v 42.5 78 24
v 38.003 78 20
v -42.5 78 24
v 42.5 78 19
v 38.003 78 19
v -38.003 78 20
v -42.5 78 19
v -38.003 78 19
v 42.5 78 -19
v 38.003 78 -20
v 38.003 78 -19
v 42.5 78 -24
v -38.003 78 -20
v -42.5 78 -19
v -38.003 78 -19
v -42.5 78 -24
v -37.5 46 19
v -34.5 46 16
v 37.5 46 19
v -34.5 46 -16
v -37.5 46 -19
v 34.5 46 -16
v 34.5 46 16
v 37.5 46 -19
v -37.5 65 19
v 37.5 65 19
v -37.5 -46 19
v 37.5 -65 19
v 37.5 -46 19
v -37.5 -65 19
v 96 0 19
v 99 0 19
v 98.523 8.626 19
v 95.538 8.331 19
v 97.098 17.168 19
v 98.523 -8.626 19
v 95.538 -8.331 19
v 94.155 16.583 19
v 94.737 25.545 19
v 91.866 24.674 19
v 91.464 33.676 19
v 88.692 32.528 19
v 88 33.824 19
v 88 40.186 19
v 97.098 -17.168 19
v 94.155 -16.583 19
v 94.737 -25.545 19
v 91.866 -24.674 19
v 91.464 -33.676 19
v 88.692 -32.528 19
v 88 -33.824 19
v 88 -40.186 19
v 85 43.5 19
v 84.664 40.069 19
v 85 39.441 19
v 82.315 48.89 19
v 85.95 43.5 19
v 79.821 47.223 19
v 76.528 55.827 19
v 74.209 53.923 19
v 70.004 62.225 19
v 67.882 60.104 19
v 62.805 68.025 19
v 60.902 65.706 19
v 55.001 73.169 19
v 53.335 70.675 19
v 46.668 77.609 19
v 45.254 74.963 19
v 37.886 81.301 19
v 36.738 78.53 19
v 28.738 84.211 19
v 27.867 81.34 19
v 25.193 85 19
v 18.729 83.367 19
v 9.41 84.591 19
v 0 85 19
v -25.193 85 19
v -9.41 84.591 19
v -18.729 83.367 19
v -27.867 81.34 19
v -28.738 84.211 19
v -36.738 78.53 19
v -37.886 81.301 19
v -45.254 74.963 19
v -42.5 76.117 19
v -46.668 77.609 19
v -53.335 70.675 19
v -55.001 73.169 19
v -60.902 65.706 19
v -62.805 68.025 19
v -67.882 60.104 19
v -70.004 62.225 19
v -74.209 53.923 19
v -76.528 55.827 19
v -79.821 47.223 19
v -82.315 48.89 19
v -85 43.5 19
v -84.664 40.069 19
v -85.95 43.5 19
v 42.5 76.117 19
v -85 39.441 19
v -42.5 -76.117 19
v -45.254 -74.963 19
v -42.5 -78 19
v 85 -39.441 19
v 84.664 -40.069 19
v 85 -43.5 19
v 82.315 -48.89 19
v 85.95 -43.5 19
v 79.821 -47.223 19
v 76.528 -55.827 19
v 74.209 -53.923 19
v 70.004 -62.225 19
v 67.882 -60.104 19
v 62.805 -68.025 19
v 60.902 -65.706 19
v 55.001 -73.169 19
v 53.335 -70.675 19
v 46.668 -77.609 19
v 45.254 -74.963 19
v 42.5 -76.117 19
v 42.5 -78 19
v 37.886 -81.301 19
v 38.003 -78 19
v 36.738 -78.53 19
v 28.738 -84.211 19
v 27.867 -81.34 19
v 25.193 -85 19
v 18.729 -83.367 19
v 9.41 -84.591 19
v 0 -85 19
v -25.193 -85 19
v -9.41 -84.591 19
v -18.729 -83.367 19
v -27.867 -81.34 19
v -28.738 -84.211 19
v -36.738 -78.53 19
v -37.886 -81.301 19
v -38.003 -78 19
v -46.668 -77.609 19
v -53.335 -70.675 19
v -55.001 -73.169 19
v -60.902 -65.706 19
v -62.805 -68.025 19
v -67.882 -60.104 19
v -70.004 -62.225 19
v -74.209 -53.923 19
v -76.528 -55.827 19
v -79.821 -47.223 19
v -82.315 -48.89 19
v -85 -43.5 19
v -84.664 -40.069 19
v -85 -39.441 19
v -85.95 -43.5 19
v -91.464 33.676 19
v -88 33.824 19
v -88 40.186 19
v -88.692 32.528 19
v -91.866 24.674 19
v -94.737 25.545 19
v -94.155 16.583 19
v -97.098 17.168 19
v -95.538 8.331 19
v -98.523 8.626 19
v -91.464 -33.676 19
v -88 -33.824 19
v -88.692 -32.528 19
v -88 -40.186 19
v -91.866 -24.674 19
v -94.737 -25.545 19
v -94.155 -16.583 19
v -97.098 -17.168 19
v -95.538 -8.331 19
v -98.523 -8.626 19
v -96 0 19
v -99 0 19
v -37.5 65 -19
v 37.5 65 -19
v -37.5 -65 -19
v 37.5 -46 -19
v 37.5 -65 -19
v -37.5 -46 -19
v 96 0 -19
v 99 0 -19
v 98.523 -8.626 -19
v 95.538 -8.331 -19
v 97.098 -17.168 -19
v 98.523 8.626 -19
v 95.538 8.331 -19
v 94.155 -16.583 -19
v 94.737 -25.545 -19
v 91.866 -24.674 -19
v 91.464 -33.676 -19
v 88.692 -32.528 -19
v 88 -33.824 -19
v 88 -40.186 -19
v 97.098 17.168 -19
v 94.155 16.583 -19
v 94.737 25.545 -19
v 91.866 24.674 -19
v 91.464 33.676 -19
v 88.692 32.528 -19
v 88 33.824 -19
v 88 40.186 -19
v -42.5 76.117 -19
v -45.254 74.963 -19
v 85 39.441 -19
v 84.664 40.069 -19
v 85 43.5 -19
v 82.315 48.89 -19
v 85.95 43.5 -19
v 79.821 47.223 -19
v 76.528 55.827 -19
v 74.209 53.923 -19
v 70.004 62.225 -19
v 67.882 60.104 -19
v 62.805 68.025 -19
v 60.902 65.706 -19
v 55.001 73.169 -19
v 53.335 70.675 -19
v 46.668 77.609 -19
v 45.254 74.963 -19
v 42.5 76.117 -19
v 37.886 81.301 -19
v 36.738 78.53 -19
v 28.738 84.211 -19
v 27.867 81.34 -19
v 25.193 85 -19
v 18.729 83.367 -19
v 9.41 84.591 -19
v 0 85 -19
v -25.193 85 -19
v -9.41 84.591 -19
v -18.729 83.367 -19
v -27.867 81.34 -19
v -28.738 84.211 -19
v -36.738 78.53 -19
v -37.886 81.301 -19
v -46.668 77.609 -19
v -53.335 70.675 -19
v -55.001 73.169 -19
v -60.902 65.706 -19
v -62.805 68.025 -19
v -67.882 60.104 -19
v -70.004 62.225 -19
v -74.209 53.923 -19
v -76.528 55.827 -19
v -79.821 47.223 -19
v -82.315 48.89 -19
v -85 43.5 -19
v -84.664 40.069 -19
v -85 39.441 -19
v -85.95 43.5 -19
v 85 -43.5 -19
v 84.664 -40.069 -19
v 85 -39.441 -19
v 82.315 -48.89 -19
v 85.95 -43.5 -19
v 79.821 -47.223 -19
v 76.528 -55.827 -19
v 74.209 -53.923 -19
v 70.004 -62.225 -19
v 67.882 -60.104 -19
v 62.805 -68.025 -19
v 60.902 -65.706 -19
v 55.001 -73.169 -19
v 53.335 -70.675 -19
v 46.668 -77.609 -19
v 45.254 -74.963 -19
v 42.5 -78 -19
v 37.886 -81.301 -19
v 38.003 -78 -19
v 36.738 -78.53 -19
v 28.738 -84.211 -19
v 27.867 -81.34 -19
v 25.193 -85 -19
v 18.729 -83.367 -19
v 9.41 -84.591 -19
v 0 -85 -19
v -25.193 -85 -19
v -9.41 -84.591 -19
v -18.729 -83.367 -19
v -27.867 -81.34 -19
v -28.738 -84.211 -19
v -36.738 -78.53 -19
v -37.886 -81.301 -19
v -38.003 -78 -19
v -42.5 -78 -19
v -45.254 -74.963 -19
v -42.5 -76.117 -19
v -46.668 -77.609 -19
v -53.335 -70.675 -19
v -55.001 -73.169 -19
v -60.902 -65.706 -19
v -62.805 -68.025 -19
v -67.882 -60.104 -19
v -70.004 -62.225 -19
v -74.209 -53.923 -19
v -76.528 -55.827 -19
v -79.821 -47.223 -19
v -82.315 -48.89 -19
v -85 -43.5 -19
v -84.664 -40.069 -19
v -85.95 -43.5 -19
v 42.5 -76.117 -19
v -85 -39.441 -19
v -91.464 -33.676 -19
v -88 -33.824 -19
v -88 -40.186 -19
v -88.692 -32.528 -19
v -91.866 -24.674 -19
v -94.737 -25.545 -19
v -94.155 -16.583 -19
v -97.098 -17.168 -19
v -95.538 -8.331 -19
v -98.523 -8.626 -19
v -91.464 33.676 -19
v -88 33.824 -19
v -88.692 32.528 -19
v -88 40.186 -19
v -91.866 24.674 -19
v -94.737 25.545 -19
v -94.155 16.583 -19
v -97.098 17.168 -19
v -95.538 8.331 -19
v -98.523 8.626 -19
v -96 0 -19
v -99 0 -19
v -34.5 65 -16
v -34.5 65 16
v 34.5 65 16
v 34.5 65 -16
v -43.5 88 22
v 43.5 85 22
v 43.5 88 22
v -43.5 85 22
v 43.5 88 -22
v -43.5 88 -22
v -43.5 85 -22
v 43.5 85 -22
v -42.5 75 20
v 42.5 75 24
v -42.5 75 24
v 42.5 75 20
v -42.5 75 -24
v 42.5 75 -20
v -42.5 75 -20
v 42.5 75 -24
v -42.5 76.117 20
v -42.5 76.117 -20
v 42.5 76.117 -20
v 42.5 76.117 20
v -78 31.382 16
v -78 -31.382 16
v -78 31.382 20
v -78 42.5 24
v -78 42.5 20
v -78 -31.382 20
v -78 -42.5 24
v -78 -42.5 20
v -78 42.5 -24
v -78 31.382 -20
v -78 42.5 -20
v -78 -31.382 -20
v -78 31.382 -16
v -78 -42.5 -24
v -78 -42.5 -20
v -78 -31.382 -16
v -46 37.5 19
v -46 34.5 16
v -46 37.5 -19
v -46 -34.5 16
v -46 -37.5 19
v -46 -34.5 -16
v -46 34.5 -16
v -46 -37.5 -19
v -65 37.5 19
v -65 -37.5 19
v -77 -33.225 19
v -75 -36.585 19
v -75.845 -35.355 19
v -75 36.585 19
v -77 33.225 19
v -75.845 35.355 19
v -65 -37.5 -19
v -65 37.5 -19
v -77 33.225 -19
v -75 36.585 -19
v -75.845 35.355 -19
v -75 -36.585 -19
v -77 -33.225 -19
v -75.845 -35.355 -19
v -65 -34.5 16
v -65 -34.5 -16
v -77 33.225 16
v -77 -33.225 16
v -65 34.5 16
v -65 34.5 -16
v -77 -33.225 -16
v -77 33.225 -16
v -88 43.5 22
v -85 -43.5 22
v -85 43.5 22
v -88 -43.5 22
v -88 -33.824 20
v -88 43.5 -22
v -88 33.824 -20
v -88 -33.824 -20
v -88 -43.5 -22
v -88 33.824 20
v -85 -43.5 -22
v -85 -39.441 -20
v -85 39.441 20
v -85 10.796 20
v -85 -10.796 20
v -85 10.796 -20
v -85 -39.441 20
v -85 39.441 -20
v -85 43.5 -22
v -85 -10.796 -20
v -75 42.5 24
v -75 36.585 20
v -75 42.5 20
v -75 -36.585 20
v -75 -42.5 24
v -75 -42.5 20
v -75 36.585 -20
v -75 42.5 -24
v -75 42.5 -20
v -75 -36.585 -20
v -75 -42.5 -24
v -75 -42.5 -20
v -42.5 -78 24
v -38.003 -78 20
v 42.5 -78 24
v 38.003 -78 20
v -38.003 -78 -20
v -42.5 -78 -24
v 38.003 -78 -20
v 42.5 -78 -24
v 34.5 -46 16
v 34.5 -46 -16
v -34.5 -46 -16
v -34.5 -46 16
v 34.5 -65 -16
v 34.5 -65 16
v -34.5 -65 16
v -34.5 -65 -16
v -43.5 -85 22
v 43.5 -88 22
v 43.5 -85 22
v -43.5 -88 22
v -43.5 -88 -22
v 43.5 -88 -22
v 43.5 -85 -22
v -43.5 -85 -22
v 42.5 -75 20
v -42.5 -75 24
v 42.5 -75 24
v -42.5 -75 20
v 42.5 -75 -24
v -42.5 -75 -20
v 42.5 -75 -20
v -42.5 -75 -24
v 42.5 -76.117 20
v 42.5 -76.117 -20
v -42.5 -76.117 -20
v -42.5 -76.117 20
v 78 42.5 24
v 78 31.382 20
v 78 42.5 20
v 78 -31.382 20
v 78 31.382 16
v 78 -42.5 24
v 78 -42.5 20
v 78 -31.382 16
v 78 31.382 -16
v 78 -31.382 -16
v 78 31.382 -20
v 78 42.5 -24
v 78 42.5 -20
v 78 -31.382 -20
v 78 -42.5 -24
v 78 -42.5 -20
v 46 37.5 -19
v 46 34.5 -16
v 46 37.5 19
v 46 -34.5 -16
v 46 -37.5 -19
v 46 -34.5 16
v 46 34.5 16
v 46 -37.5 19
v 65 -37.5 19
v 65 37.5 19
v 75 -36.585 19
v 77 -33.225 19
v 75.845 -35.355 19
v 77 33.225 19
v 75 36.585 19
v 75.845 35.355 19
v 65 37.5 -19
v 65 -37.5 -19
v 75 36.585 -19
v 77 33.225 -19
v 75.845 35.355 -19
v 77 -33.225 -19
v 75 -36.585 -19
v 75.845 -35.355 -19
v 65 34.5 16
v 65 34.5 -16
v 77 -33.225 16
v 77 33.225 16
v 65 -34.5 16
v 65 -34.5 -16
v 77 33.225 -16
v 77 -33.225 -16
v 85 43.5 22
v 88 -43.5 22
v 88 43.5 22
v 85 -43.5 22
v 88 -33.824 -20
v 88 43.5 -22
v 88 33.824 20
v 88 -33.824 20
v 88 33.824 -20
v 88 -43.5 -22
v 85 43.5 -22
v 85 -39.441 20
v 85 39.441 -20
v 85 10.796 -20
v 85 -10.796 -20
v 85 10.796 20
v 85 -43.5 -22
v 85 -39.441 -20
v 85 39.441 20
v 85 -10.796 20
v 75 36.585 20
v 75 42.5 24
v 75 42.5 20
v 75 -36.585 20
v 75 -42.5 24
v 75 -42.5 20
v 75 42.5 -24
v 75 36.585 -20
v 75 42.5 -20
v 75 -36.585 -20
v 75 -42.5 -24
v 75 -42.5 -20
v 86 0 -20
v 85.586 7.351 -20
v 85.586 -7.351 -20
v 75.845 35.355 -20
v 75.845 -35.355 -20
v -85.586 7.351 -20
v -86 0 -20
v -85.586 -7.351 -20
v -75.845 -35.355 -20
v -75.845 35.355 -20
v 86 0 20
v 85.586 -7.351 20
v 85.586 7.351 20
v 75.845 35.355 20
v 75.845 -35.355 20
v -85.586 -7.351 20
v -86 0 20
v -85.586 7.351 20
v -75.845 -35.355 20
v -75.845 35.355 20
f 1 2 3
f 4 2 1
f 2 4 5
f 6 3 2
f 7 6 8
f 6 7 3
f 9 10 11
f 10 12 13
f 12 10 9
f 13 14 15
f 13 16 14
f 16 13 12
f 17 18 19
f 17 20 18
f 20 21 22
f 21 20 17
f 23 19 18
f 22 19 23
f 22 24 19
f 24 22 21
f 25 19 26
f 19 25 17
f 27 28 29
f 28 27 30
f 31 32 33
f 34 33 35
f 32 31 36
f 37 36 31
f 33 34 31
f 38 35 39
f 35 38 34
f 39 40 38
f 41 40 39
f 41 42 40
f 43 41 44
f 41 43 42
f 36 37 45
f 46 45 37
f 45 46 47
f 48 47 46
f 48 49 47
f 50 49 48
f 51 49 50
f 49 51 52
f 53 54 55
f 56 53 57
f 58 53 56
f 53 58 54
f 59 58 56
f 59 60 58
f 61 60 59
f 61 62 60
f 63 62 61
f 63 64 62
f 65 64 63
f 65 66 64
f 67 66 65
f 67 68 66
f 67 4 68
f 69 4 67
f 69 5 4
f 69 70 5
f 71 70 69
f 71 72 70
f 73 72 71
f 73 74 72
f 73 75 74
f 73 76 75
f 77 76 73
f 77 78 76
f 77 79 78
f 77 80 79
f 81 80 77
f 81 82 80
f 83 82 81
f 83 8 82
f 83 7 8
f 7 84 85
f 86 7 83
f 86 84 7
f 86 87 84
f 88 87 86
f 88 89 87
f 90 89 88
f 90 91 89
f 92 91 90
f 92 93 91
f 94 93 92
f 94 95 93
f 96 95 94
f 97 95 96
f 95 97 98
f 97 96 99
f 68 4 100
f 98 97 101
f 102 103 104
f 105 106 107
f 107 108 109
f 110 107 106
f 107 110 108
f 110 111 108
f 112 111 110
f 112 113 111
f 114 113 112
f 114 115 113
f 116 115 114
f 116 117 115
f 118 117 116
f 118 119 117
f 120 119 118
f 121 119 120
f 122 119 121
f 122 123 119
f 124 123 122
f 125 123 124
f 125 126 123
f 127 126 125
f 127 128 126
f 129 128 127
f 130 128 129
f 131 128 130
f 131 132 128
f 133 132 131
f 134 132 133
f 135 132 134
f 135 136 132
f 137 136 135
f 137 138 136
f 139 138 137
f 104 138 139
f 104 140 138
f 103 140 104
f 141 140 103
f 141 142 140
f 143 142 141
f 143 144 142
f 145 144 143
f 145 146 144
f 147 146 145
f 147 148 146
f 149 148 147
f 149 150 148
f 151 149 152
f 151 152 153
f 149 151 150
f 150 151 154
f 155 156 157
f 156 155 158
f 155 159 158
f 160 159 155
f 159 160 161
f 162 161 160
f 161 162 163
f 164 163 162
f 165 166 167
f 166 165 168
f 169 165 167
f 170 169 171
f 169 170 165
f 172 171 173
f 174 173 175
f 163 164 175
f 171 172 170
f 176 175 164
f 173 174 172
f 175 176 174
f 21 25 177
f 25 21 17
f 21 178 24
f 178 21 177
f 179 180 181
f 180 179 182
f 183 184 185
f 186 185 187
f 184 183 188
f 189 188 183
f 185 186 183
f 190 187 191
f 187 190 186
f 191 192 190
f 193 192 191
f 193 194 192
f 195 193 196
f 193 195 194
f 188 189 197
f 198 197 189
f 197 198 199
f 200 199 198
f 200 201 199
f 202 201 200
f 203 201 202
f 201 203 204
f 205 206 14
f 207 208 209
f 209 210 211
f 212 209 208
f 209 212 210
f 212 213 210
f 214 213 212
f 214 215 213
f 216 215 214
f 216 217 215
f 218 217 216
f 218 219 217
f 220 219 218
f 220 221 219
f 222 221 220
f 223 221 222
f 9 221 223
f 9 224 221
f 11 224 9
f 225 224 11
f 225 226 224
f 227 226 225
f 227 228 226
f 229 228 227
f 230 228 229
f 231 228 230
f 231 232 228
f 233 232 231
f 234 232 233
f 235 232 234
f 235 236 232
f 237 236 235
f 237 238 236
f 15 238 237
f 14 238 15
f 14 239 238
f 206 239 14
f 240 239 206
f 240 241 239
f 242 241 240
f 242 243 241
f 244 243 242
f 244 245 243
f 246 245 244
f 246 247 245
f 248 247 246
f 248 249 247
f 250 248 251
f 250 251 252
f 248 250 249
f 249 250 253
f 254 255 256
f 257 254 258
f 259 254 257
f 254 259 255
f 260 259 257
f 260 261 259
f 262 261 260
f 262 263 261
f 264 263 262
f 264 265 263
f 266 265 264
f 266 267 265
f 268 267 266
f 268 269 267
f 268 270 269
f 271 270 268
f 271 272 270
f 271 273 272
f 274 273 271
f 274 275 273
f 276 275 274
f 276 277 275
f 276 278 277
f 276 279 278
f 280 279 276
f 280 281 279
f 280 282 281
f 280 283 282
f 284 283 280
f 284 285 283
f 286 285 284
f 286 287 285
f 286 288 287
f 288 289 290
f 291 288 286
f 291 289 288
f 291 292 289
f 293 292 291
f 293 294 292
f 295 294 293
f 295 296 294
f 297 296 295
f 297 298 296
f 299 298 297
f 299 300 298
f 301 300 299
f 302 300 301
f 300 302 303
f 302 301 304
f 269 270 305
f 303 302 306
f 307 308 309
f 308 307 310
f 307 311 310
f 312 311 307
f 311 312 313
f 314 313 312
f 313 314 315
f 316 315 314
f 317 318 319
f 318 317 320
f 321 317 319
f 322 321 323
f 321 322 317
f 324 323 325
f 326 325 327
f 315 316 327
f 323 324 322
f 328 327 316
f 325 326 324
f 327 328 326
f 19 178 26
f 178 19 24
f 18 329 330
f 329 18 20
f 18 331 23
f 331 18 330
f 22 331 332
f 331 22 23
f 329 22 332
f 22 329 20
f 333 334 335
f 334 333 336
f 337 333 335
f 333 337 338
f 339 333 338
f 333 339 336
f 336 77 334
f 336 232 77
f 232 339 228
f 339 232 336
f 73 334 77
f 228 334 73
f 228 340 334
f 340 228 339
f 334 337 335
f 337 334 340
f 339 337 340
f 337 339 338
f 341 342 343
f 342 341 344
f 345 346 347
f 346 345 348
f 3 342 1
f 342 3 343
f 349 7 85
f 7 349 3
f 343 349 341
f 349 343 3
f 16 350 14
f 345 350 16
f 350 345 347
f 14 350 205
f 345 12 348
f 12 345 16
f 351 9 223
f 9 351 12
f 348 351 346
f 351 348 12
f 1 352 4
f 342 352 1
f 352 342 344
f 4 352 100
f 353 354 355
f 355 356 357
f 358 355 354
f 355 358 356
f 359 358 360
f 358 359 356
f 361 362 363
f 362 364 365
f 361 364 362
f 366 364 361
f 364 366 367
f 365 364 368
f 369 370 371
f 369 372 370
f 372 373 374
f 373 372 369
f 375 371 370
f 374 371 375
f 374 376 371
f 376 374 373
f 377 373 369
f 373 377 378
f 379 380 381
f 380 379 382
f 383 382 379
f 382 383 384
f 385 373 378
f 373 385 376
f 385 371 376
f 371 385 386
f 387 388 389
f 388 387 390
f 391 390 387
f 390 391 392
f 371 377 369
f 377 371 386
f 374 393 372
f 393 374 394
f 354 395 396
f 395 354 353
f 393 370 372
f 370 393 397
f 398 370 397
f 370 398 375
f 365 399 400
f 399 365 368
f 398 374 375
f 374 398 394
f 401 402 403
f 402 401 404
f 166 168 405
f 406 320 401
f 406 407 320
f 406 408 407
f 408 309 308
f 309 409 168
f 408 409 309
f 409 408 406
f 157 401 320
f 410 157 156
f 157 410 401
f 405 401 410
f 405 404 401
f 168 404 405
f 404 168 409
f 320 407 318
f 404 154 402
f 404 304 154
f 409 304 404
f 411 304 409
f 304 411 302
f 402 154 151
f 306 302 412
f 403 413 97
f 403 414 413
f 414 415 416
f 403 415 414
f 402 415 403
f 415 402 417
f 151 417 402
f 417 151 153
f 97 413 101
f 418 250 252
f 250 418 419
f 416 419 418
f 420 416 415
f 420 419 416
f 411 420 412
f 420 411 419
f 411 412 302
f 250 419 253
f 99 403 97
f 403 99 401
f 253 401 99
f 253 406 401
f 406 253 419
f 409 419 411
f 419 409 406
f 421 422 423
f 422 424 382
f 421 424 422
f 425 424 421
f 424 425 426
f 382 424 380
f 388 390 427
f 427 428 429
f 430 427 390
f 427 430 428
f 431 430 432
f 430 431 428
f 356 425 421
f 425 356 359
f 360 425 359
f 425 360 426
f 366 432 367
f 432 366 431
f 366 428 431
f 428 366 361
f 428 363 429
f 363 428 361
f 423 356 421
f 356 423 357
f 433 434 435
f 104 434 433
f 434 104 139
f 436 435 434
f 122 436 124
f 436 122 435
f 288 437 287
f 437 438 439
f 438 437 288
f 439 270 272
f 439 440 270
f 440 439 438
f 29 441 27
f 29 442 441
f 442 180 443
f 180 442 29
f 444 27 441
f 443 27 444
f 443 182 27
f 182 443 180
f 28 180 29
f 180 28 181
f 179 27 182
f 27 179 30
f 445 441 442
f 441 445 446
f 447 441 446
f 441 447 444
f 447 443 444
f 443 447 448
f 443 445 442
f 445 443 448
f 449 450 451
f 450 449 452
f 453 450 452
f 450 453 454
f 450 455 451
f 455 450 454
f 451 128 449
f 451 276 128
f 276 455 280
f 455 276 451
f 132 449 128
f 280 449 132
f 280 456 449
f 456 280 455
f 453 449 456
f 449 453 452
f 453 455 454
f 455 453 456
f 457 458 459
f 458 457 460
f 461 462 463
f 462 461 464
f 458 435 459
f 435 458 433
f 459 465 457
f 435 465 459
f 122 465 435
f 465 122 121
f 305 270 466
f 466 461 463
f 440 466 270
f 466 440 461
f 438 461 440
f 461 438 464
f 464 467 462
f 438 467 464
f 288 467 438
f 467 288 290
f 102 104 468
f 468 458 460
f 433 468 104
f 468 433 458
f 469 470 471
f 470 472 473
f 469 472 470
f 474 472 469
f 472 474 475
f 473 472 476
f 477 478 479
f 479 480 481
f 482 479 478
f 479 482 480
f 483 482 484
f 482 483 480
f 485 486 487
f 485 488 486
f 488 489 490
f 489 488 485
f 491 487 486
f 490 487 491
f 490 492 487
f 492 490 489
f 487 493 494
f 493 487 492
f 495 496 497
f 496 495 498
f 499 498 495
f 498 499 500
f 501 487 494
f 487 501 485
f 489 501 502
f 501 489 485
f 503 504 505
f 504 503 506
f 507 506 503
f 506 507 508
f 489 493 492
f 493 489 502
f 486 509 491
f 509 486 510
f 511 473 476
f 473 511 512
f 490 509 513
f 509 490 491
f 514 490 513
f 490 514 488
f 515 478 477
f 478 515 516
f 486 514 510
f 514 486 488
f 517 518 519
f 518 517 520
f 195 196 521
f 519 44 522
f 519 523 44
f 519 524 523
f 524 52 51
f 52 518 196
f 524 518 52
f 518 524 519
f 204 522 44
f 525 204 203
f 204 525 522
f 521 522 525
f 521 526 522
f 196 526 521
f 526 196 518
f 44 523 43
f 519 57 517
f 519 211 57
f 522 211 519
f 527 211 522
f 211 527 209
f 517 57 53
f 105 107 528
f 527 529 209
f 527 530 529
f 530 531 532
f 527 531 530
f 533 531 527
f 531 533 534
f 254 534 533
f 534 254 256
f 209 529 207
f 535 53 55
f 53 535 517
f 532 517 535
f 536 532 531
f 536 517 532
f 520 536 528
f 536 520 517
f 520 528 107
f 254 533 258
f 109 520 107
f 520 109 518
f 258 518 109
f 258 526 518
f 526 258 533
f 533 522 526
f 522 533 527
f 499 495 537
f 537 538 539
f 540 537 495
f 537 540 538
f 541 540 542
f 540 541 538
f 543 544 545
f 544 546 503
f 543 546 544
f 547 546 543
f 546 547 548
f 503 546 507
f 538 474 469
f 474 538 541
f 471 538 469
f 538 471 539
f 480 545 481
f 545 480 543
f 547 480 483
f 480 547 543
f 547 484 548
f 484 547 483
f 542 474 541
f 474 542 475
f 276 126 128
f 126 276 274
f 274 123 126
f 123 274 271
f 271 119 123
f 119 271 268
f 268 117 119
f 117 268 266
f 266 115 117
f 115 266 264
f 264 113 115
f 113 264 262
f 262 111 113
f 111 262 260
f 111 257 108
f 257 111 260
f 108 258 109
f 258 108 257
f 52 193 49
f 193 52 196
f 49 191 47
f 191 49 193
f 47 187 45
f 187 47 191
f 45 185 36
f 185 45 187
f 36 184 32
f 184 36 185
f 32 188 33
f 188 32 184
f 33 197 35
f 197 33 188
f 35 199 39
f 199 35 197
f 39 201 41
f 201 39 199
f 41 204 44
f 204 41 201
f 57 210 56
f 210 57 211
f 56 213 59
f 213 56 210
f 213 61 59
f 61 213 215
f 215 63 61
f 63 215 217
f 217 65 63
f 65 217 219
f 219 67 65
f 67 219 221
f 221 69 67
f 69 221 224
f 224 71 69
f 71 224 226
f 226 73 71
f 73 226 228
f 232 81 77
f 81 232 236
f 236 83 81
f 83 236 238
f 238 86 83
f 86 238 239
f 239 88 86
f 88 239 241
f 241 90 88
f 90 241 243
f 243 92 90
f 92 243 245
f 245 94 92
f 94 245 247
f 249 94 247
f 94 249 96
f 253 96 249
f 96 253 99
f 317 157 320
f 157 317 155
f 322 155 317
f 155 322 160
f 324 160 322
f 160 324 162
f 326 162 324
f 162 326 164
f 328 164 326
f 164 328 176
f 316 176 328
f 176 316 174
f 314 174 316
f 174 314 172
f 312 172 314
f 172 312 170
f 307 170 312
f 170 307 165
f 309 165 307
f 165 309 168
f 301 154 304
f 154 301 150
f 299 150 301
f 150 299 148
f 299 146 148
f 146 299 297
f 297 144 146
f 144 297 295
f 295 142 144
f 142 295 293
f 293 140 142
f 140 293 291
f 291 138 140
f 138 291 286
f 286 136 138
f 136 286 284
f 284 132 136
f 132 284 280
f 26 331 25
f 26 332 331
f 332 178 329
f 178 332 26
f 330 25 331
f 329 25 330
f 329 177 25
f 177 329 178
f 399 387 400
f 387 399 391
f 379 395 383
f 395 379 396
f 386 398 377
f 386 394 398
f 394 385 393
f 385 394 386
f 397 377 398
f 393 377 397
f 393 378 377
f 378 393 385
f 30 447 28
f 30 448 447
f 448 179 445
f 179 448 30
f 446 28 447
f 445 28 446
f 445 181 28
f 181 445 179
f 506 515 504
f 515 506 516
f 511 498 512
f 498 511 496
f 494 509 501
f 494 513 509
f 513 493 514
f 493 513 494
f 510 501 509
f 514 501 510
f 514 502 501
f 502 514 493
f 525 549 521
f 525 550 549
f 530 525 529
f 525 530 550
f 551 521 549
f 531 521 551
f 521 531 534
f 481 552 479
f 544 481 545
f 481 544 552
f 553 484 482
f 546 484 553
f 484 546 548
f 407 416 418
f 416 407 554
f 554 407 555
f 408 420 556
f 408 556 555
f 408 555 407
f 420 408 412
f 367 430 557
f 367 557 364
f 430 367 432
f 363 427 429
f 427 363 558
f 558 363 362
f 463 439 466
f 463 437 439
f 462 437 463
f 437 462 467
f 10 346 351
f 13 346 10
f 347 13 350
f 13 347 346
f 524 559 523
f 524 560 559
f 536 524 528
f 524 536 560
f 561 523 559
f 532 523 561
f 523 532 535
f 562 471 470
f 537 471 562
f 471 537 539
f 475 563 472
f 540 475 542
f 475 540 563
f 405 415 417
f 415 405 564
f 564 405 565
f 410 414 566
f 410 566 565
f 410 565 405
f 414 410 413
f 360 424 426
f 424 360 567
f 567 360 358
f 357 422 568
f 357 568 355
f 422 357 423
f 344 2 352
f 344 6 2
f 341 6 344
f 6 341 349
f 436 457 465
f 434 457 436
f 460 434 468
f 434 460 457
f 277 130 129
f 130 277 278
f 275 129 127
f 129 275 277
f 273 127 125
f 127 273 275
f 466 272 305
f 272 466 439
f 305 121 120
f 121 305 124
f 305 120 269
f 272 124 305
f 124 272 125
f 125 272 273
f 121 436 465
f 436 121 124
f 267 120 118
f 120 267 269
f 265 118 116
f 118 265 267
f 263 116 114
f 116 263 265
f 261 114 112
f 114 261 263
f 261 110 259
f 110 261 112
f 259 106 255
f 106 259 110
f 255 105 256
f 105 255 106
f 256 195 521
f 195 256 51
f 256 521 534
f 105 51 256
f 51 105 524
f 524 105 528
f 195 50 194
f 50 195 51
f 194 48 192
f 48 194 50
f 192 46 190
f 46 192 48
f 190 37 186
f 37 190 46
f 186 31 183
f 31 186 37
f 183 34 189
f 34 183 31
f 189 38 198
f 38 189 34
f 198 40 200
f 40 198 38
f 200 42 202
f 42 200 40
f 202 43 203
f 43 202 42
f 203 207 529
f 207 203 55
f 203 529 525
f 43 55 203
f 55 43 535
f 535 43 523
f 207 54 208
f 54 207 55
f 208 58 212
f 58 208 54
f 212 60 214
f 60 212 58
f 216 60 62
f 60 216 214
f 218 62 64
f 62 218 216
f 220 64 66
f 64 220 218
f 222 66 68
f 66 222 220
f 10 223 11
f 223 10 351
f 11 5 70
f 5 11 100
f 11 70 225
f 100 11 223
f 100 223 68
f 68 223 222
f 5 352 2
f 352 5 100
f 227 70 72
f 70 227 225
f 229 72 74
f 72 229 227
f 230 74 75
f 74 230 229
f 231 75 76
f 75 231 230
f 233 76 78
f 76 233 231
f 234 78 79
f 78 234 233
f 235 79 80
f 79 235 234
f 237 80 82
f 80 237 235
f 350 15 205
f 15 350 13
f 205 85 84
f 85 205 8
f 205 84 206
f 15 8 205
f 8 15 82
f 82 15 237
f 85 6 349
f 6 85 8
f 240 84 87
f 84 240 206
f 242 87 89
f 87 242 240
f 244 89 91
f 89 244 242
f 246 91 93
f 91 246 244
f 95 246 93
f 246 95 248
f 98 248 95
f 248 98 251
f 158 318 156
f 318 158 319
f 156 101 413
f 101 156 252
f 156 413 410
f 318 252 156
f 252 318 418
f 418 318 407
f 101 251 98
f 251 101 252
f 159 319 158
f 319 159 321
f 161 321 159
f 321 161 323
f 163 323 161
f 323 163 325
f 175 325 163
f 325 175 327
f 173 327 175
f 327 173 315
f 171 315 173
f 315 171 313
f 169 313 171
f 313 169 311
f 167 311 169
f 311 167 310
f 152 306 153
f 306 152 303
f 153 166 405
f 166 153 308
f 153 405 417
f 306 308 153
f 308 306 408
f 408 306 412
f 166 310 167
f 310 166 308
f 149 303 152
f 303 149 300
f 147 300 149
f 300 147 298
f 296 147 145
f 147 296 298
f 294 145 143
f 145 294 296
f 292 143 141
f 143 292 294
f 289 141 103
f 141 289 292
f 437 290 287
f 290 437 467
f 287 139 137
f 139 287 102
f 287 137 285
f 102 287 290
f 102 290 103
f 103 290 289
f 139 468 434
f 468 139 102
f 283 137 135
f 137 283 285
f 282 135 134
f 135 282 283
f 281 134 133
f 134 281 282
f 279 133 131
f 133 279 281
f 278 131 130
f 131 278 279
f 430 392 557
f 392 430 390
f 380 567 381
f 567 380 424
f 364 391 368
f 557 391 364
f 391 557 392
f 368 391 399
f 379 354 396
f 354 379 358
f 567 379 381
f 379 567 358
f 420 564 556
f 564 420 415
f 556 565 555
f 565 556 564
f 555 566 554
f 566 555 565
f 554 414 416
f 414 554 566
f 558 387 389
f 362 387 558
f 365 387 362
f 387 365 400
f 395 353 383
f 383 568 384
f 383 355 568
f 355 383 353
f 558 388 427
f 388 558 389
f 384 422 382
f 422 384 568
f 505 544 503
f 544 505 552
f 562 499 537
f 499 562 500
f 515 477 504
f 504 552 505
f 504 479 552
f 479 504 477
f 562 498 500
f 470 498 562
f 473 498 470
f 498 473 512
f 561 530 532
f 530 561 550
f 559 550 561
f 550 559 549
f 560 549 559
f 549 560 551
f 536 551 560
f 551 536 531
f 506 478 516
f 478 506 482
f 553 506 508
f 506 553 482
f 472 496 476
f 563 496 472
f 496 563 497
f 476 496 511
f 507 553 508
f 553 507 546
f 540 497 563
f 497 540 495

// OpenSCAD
// ===========================================================================
// HULL-FRAME COORDINATE STANDARD - Rev R1 (2026-06-11).  See CLAUDE.md.
//   Hull frame (canonical for ALL design artifacts): X = +port (left),
//   Y = +aft (back), Z = +dorsal (up); origin = SerenityAssembly.FCStd
//   world origin.  Primary-component STLs published to airframe/stls/
//   are stored directly in hull frame, baked by tools/bake_hull_frame.py
//   (marker 'SerenityUAV HULL-FRAME R1' in the binary STL header).
//   NEVER re-bake a mesh derived from an already-baked file.
//   This file:
//     Part-local frame.  DEFERRED - Phase 11 (aft fuselage EDF).  On
//     integration, position in hull frame per the validated assembly and
//     bake or place explicitly; stations quoted from nose convert to hull
//     Y via nose tip at hull Y = -305.6 mm.
// ===========================================================================
// neck_intake_frame.scad
// CF-PETG structural intake frame ring for Serenity Rev N 24" hull.
// Bonds into the 4 radial scoop cutouts in middle_canonical_edf_intake.stl
// at the neck station (Z = 30 mm in the neck shell, Z-longitudinal coords).
// Print in CF-PETG; bond with structural epoxy.
//
// Rev C (2026-06-02): Z-longitudinal axis correction.
//   Coordinate system: Z = longitudinal (fore-aft), X = lateral, Y = vertical.
//   Both middle and rear shells sit on their flat Z=0 face for printing.
//   Hull dimensions re-measured via Z-slice at Z=30 mm.
//   See blender_middle_intake_cut.py Rev C for matching hull cut parameters.
//
// Coordinate origin: hull XY centreline at intake station.
// Frame axial direction = Z (same as hull longitudinal).

// ── Hull cross-section at intake station Z = 30 mm (measured, 24" scale) ────
// Source: Z-slice sweep of middle_canonical_shell24.stl,
//   Serenity UAV project log 2026-06-02 (Z-longitudinal Rev C).
// At Z=30: X span=177 mm (centre X=180.9), Y span=156.5 mm (centre Y=-77.8).
// Half-dimensions from XY centreline:
//   X half-width  = 88.5 mm → HULL_W2 = 89
//   Y half-height = 78.3 mm → HULL_H2 = 78
HULL_W2  = 89;     // X lateral half-width from centreline       [mm]
HULL_H2  = 78;     // Y vertical half-height from centreline     [mm]
HULL_WL  = 177;    // full width  (= 2 × HULL_W2 − 1)
HULL_HL  = 157;    // full height (= 2 × HULL_H2 + rounding)

// ── Scoop window dimensions ──────────────────────────────────────────────────
// Matched to blender_middle_intake_cut.py Rev C: SCOOP_W=75, SCOOP_H=38.
// X-scoops: 48 mm wall remaining.  Y-scoops: 37 mm wall remaining.
// Total capture area: 4 × 75 × 38 = 11 400 mm² (≈ 107 % of EDF fan annulus).
SCOOP_W  = 75;     // circumferential window width               [mm]
SCOOP_H  = 38;     // radial window height                       [mm]

// ── Frame geometry ───────────────────────────────────────────────────────────
FRAME_AX = 38;     // axial length of frame ring (matches SCOOP_AX) [mm]
FRAME_RD = 10;     // radial depth of frame collar               [mm]
WALL     =  3;     // CF-PETG wall thickness                     [mm]
TONGUE_D =  5;     // tongue depth inserting into hull cutout    [mm]
SHOULDER =  5;     // bonding shoulder pressing on hull exterior  [mm]
LIP      =  6;     // forward aerodynamic lip projection          [mm]
DUCT_L   = 22;     // internal duct arm length inward (→ plenum) [mm]

// ── Derived ─────────────────────────────────────────────────────────────────
$fn = 64;
HALF_AX  = FRAME_AX / 2;

// ── Main module ─────────────────────────────────────────────────────────────
module neck_intake_frame() {
    difference() {
        union() {
            _elliptical_collar();
            for (a = [0, 90, 180, 270])
                rotate([0, 0, a]) _scoop_duct();
        }
        // Cut the 4 scoop windows through the collar
        for (a = [0, 90, 180, 270])
            rotate([0, 0, a]) _scoop_window();
        // Hollow the collar interior (leave WALL-thick walls)
        _collar_hollow();
    }
}

// Elliptical ring collar that matches hull outer profile + FRAME_RD
module _elliptical_collar() {
    linear_extrude(height = FRAME_AX, center = true)
    difference() {
        // Outer ellipse: hull outer surface + frame radial depth
        scale([(HULL_W2 + FRAME_RD) / HULL_W2,
               (HULL_H2 + FRAME_RD) / HULL_H2])
            ellipse(HULL_W2, HULL_H2);
        // Inner cut: hull outer surface (frame sits on hull exterior)
        ellipse(HULL_W2, HULL_H2);
    }
}

// Thin-wall hollow inside the collar (keep WALL thickness)
module _collar_hollow() {
    linear_extrude(height = FRAME_AX + 2, center = true)
    difference() {
        scale([(HULL_W2 + FRAME_RD - WALL) / HULL_W2,
               (HULL_H2 + FRAME_RD - WALL) / HULL_H2])
            ellipse(HULL_W2, HULL_H2);
        ellipse(HULL_W2 - WALL, HULL_H2 - WALL);
    }
}

// One scoop duct arm (placed pointing +Y before rotation)
// Extends radially inward from the collar opening toward the plenum
module _scoop_duct() {
    // Duct arm: rectangular tube from hull inner wall to plenum centre
    translate([0, HULL_H2, 0])
    rotate([90, 0, 0])
    linear_extrude(height = DUCT_L + FRAME_RD)
    difference() {
        square([SCOOP_W, SCOOP_H], center = true);
        square([SCOOP_W - 2*WALL, SCOOP_H - 2*WALL], center = true);
    }

    // Aerodynamic intake lip on forward edge
    translate([0, HULL_H2 + FRAME_RD, 0])
    rotate([90, 0, 0])
    linear_extrude(height = WALL)
    hull() {
        square([SCOOP_W, SCOOP_H], center = true);
        square([SCOOP_W + LIP*2, SCOOP_H + LIP], center = true);
    }

    // Registration tongue: projects into hull cutout (thin, snug fit)
    translate([0, HULL_H2 - TONGUE_D, 0])
    rotate([90, 0, 0])
    linear_extrude(height = TONGUE_D)
    square([SCOOP_W - 0.4, SCOOP_H - 0.4], center = true);  // 0.2mm clearance

    // Bonding shoulder: flange pressing on hull exterior
    translate([0, HULL_H2, 0])
    rotate([90, 0, 0])
    linear_extrude(height = WALL)
    difference() {
        square([SCOOP_W + SHOULDER*2, SCOOP_H + SHOULDER*2], center = true);
        square([SCOOP_W, SCOOP_H], center = true);
    }
}

// Window cut through collar at each scoop position
module _scoop_window() {
    translate([0, HULL_H2 - 1, 0])
    rotate([90, 0, 0])
    linear_extrude(height = FRAME_RD + 2)
    square([SCOOP_W, SCOOP_H], center = true);
}

// Helper: 2D ellipse
module ellipse(rx, ry) {
    scale([rx, ry]) circle(r = 1);
}

neck_intake_frame();
